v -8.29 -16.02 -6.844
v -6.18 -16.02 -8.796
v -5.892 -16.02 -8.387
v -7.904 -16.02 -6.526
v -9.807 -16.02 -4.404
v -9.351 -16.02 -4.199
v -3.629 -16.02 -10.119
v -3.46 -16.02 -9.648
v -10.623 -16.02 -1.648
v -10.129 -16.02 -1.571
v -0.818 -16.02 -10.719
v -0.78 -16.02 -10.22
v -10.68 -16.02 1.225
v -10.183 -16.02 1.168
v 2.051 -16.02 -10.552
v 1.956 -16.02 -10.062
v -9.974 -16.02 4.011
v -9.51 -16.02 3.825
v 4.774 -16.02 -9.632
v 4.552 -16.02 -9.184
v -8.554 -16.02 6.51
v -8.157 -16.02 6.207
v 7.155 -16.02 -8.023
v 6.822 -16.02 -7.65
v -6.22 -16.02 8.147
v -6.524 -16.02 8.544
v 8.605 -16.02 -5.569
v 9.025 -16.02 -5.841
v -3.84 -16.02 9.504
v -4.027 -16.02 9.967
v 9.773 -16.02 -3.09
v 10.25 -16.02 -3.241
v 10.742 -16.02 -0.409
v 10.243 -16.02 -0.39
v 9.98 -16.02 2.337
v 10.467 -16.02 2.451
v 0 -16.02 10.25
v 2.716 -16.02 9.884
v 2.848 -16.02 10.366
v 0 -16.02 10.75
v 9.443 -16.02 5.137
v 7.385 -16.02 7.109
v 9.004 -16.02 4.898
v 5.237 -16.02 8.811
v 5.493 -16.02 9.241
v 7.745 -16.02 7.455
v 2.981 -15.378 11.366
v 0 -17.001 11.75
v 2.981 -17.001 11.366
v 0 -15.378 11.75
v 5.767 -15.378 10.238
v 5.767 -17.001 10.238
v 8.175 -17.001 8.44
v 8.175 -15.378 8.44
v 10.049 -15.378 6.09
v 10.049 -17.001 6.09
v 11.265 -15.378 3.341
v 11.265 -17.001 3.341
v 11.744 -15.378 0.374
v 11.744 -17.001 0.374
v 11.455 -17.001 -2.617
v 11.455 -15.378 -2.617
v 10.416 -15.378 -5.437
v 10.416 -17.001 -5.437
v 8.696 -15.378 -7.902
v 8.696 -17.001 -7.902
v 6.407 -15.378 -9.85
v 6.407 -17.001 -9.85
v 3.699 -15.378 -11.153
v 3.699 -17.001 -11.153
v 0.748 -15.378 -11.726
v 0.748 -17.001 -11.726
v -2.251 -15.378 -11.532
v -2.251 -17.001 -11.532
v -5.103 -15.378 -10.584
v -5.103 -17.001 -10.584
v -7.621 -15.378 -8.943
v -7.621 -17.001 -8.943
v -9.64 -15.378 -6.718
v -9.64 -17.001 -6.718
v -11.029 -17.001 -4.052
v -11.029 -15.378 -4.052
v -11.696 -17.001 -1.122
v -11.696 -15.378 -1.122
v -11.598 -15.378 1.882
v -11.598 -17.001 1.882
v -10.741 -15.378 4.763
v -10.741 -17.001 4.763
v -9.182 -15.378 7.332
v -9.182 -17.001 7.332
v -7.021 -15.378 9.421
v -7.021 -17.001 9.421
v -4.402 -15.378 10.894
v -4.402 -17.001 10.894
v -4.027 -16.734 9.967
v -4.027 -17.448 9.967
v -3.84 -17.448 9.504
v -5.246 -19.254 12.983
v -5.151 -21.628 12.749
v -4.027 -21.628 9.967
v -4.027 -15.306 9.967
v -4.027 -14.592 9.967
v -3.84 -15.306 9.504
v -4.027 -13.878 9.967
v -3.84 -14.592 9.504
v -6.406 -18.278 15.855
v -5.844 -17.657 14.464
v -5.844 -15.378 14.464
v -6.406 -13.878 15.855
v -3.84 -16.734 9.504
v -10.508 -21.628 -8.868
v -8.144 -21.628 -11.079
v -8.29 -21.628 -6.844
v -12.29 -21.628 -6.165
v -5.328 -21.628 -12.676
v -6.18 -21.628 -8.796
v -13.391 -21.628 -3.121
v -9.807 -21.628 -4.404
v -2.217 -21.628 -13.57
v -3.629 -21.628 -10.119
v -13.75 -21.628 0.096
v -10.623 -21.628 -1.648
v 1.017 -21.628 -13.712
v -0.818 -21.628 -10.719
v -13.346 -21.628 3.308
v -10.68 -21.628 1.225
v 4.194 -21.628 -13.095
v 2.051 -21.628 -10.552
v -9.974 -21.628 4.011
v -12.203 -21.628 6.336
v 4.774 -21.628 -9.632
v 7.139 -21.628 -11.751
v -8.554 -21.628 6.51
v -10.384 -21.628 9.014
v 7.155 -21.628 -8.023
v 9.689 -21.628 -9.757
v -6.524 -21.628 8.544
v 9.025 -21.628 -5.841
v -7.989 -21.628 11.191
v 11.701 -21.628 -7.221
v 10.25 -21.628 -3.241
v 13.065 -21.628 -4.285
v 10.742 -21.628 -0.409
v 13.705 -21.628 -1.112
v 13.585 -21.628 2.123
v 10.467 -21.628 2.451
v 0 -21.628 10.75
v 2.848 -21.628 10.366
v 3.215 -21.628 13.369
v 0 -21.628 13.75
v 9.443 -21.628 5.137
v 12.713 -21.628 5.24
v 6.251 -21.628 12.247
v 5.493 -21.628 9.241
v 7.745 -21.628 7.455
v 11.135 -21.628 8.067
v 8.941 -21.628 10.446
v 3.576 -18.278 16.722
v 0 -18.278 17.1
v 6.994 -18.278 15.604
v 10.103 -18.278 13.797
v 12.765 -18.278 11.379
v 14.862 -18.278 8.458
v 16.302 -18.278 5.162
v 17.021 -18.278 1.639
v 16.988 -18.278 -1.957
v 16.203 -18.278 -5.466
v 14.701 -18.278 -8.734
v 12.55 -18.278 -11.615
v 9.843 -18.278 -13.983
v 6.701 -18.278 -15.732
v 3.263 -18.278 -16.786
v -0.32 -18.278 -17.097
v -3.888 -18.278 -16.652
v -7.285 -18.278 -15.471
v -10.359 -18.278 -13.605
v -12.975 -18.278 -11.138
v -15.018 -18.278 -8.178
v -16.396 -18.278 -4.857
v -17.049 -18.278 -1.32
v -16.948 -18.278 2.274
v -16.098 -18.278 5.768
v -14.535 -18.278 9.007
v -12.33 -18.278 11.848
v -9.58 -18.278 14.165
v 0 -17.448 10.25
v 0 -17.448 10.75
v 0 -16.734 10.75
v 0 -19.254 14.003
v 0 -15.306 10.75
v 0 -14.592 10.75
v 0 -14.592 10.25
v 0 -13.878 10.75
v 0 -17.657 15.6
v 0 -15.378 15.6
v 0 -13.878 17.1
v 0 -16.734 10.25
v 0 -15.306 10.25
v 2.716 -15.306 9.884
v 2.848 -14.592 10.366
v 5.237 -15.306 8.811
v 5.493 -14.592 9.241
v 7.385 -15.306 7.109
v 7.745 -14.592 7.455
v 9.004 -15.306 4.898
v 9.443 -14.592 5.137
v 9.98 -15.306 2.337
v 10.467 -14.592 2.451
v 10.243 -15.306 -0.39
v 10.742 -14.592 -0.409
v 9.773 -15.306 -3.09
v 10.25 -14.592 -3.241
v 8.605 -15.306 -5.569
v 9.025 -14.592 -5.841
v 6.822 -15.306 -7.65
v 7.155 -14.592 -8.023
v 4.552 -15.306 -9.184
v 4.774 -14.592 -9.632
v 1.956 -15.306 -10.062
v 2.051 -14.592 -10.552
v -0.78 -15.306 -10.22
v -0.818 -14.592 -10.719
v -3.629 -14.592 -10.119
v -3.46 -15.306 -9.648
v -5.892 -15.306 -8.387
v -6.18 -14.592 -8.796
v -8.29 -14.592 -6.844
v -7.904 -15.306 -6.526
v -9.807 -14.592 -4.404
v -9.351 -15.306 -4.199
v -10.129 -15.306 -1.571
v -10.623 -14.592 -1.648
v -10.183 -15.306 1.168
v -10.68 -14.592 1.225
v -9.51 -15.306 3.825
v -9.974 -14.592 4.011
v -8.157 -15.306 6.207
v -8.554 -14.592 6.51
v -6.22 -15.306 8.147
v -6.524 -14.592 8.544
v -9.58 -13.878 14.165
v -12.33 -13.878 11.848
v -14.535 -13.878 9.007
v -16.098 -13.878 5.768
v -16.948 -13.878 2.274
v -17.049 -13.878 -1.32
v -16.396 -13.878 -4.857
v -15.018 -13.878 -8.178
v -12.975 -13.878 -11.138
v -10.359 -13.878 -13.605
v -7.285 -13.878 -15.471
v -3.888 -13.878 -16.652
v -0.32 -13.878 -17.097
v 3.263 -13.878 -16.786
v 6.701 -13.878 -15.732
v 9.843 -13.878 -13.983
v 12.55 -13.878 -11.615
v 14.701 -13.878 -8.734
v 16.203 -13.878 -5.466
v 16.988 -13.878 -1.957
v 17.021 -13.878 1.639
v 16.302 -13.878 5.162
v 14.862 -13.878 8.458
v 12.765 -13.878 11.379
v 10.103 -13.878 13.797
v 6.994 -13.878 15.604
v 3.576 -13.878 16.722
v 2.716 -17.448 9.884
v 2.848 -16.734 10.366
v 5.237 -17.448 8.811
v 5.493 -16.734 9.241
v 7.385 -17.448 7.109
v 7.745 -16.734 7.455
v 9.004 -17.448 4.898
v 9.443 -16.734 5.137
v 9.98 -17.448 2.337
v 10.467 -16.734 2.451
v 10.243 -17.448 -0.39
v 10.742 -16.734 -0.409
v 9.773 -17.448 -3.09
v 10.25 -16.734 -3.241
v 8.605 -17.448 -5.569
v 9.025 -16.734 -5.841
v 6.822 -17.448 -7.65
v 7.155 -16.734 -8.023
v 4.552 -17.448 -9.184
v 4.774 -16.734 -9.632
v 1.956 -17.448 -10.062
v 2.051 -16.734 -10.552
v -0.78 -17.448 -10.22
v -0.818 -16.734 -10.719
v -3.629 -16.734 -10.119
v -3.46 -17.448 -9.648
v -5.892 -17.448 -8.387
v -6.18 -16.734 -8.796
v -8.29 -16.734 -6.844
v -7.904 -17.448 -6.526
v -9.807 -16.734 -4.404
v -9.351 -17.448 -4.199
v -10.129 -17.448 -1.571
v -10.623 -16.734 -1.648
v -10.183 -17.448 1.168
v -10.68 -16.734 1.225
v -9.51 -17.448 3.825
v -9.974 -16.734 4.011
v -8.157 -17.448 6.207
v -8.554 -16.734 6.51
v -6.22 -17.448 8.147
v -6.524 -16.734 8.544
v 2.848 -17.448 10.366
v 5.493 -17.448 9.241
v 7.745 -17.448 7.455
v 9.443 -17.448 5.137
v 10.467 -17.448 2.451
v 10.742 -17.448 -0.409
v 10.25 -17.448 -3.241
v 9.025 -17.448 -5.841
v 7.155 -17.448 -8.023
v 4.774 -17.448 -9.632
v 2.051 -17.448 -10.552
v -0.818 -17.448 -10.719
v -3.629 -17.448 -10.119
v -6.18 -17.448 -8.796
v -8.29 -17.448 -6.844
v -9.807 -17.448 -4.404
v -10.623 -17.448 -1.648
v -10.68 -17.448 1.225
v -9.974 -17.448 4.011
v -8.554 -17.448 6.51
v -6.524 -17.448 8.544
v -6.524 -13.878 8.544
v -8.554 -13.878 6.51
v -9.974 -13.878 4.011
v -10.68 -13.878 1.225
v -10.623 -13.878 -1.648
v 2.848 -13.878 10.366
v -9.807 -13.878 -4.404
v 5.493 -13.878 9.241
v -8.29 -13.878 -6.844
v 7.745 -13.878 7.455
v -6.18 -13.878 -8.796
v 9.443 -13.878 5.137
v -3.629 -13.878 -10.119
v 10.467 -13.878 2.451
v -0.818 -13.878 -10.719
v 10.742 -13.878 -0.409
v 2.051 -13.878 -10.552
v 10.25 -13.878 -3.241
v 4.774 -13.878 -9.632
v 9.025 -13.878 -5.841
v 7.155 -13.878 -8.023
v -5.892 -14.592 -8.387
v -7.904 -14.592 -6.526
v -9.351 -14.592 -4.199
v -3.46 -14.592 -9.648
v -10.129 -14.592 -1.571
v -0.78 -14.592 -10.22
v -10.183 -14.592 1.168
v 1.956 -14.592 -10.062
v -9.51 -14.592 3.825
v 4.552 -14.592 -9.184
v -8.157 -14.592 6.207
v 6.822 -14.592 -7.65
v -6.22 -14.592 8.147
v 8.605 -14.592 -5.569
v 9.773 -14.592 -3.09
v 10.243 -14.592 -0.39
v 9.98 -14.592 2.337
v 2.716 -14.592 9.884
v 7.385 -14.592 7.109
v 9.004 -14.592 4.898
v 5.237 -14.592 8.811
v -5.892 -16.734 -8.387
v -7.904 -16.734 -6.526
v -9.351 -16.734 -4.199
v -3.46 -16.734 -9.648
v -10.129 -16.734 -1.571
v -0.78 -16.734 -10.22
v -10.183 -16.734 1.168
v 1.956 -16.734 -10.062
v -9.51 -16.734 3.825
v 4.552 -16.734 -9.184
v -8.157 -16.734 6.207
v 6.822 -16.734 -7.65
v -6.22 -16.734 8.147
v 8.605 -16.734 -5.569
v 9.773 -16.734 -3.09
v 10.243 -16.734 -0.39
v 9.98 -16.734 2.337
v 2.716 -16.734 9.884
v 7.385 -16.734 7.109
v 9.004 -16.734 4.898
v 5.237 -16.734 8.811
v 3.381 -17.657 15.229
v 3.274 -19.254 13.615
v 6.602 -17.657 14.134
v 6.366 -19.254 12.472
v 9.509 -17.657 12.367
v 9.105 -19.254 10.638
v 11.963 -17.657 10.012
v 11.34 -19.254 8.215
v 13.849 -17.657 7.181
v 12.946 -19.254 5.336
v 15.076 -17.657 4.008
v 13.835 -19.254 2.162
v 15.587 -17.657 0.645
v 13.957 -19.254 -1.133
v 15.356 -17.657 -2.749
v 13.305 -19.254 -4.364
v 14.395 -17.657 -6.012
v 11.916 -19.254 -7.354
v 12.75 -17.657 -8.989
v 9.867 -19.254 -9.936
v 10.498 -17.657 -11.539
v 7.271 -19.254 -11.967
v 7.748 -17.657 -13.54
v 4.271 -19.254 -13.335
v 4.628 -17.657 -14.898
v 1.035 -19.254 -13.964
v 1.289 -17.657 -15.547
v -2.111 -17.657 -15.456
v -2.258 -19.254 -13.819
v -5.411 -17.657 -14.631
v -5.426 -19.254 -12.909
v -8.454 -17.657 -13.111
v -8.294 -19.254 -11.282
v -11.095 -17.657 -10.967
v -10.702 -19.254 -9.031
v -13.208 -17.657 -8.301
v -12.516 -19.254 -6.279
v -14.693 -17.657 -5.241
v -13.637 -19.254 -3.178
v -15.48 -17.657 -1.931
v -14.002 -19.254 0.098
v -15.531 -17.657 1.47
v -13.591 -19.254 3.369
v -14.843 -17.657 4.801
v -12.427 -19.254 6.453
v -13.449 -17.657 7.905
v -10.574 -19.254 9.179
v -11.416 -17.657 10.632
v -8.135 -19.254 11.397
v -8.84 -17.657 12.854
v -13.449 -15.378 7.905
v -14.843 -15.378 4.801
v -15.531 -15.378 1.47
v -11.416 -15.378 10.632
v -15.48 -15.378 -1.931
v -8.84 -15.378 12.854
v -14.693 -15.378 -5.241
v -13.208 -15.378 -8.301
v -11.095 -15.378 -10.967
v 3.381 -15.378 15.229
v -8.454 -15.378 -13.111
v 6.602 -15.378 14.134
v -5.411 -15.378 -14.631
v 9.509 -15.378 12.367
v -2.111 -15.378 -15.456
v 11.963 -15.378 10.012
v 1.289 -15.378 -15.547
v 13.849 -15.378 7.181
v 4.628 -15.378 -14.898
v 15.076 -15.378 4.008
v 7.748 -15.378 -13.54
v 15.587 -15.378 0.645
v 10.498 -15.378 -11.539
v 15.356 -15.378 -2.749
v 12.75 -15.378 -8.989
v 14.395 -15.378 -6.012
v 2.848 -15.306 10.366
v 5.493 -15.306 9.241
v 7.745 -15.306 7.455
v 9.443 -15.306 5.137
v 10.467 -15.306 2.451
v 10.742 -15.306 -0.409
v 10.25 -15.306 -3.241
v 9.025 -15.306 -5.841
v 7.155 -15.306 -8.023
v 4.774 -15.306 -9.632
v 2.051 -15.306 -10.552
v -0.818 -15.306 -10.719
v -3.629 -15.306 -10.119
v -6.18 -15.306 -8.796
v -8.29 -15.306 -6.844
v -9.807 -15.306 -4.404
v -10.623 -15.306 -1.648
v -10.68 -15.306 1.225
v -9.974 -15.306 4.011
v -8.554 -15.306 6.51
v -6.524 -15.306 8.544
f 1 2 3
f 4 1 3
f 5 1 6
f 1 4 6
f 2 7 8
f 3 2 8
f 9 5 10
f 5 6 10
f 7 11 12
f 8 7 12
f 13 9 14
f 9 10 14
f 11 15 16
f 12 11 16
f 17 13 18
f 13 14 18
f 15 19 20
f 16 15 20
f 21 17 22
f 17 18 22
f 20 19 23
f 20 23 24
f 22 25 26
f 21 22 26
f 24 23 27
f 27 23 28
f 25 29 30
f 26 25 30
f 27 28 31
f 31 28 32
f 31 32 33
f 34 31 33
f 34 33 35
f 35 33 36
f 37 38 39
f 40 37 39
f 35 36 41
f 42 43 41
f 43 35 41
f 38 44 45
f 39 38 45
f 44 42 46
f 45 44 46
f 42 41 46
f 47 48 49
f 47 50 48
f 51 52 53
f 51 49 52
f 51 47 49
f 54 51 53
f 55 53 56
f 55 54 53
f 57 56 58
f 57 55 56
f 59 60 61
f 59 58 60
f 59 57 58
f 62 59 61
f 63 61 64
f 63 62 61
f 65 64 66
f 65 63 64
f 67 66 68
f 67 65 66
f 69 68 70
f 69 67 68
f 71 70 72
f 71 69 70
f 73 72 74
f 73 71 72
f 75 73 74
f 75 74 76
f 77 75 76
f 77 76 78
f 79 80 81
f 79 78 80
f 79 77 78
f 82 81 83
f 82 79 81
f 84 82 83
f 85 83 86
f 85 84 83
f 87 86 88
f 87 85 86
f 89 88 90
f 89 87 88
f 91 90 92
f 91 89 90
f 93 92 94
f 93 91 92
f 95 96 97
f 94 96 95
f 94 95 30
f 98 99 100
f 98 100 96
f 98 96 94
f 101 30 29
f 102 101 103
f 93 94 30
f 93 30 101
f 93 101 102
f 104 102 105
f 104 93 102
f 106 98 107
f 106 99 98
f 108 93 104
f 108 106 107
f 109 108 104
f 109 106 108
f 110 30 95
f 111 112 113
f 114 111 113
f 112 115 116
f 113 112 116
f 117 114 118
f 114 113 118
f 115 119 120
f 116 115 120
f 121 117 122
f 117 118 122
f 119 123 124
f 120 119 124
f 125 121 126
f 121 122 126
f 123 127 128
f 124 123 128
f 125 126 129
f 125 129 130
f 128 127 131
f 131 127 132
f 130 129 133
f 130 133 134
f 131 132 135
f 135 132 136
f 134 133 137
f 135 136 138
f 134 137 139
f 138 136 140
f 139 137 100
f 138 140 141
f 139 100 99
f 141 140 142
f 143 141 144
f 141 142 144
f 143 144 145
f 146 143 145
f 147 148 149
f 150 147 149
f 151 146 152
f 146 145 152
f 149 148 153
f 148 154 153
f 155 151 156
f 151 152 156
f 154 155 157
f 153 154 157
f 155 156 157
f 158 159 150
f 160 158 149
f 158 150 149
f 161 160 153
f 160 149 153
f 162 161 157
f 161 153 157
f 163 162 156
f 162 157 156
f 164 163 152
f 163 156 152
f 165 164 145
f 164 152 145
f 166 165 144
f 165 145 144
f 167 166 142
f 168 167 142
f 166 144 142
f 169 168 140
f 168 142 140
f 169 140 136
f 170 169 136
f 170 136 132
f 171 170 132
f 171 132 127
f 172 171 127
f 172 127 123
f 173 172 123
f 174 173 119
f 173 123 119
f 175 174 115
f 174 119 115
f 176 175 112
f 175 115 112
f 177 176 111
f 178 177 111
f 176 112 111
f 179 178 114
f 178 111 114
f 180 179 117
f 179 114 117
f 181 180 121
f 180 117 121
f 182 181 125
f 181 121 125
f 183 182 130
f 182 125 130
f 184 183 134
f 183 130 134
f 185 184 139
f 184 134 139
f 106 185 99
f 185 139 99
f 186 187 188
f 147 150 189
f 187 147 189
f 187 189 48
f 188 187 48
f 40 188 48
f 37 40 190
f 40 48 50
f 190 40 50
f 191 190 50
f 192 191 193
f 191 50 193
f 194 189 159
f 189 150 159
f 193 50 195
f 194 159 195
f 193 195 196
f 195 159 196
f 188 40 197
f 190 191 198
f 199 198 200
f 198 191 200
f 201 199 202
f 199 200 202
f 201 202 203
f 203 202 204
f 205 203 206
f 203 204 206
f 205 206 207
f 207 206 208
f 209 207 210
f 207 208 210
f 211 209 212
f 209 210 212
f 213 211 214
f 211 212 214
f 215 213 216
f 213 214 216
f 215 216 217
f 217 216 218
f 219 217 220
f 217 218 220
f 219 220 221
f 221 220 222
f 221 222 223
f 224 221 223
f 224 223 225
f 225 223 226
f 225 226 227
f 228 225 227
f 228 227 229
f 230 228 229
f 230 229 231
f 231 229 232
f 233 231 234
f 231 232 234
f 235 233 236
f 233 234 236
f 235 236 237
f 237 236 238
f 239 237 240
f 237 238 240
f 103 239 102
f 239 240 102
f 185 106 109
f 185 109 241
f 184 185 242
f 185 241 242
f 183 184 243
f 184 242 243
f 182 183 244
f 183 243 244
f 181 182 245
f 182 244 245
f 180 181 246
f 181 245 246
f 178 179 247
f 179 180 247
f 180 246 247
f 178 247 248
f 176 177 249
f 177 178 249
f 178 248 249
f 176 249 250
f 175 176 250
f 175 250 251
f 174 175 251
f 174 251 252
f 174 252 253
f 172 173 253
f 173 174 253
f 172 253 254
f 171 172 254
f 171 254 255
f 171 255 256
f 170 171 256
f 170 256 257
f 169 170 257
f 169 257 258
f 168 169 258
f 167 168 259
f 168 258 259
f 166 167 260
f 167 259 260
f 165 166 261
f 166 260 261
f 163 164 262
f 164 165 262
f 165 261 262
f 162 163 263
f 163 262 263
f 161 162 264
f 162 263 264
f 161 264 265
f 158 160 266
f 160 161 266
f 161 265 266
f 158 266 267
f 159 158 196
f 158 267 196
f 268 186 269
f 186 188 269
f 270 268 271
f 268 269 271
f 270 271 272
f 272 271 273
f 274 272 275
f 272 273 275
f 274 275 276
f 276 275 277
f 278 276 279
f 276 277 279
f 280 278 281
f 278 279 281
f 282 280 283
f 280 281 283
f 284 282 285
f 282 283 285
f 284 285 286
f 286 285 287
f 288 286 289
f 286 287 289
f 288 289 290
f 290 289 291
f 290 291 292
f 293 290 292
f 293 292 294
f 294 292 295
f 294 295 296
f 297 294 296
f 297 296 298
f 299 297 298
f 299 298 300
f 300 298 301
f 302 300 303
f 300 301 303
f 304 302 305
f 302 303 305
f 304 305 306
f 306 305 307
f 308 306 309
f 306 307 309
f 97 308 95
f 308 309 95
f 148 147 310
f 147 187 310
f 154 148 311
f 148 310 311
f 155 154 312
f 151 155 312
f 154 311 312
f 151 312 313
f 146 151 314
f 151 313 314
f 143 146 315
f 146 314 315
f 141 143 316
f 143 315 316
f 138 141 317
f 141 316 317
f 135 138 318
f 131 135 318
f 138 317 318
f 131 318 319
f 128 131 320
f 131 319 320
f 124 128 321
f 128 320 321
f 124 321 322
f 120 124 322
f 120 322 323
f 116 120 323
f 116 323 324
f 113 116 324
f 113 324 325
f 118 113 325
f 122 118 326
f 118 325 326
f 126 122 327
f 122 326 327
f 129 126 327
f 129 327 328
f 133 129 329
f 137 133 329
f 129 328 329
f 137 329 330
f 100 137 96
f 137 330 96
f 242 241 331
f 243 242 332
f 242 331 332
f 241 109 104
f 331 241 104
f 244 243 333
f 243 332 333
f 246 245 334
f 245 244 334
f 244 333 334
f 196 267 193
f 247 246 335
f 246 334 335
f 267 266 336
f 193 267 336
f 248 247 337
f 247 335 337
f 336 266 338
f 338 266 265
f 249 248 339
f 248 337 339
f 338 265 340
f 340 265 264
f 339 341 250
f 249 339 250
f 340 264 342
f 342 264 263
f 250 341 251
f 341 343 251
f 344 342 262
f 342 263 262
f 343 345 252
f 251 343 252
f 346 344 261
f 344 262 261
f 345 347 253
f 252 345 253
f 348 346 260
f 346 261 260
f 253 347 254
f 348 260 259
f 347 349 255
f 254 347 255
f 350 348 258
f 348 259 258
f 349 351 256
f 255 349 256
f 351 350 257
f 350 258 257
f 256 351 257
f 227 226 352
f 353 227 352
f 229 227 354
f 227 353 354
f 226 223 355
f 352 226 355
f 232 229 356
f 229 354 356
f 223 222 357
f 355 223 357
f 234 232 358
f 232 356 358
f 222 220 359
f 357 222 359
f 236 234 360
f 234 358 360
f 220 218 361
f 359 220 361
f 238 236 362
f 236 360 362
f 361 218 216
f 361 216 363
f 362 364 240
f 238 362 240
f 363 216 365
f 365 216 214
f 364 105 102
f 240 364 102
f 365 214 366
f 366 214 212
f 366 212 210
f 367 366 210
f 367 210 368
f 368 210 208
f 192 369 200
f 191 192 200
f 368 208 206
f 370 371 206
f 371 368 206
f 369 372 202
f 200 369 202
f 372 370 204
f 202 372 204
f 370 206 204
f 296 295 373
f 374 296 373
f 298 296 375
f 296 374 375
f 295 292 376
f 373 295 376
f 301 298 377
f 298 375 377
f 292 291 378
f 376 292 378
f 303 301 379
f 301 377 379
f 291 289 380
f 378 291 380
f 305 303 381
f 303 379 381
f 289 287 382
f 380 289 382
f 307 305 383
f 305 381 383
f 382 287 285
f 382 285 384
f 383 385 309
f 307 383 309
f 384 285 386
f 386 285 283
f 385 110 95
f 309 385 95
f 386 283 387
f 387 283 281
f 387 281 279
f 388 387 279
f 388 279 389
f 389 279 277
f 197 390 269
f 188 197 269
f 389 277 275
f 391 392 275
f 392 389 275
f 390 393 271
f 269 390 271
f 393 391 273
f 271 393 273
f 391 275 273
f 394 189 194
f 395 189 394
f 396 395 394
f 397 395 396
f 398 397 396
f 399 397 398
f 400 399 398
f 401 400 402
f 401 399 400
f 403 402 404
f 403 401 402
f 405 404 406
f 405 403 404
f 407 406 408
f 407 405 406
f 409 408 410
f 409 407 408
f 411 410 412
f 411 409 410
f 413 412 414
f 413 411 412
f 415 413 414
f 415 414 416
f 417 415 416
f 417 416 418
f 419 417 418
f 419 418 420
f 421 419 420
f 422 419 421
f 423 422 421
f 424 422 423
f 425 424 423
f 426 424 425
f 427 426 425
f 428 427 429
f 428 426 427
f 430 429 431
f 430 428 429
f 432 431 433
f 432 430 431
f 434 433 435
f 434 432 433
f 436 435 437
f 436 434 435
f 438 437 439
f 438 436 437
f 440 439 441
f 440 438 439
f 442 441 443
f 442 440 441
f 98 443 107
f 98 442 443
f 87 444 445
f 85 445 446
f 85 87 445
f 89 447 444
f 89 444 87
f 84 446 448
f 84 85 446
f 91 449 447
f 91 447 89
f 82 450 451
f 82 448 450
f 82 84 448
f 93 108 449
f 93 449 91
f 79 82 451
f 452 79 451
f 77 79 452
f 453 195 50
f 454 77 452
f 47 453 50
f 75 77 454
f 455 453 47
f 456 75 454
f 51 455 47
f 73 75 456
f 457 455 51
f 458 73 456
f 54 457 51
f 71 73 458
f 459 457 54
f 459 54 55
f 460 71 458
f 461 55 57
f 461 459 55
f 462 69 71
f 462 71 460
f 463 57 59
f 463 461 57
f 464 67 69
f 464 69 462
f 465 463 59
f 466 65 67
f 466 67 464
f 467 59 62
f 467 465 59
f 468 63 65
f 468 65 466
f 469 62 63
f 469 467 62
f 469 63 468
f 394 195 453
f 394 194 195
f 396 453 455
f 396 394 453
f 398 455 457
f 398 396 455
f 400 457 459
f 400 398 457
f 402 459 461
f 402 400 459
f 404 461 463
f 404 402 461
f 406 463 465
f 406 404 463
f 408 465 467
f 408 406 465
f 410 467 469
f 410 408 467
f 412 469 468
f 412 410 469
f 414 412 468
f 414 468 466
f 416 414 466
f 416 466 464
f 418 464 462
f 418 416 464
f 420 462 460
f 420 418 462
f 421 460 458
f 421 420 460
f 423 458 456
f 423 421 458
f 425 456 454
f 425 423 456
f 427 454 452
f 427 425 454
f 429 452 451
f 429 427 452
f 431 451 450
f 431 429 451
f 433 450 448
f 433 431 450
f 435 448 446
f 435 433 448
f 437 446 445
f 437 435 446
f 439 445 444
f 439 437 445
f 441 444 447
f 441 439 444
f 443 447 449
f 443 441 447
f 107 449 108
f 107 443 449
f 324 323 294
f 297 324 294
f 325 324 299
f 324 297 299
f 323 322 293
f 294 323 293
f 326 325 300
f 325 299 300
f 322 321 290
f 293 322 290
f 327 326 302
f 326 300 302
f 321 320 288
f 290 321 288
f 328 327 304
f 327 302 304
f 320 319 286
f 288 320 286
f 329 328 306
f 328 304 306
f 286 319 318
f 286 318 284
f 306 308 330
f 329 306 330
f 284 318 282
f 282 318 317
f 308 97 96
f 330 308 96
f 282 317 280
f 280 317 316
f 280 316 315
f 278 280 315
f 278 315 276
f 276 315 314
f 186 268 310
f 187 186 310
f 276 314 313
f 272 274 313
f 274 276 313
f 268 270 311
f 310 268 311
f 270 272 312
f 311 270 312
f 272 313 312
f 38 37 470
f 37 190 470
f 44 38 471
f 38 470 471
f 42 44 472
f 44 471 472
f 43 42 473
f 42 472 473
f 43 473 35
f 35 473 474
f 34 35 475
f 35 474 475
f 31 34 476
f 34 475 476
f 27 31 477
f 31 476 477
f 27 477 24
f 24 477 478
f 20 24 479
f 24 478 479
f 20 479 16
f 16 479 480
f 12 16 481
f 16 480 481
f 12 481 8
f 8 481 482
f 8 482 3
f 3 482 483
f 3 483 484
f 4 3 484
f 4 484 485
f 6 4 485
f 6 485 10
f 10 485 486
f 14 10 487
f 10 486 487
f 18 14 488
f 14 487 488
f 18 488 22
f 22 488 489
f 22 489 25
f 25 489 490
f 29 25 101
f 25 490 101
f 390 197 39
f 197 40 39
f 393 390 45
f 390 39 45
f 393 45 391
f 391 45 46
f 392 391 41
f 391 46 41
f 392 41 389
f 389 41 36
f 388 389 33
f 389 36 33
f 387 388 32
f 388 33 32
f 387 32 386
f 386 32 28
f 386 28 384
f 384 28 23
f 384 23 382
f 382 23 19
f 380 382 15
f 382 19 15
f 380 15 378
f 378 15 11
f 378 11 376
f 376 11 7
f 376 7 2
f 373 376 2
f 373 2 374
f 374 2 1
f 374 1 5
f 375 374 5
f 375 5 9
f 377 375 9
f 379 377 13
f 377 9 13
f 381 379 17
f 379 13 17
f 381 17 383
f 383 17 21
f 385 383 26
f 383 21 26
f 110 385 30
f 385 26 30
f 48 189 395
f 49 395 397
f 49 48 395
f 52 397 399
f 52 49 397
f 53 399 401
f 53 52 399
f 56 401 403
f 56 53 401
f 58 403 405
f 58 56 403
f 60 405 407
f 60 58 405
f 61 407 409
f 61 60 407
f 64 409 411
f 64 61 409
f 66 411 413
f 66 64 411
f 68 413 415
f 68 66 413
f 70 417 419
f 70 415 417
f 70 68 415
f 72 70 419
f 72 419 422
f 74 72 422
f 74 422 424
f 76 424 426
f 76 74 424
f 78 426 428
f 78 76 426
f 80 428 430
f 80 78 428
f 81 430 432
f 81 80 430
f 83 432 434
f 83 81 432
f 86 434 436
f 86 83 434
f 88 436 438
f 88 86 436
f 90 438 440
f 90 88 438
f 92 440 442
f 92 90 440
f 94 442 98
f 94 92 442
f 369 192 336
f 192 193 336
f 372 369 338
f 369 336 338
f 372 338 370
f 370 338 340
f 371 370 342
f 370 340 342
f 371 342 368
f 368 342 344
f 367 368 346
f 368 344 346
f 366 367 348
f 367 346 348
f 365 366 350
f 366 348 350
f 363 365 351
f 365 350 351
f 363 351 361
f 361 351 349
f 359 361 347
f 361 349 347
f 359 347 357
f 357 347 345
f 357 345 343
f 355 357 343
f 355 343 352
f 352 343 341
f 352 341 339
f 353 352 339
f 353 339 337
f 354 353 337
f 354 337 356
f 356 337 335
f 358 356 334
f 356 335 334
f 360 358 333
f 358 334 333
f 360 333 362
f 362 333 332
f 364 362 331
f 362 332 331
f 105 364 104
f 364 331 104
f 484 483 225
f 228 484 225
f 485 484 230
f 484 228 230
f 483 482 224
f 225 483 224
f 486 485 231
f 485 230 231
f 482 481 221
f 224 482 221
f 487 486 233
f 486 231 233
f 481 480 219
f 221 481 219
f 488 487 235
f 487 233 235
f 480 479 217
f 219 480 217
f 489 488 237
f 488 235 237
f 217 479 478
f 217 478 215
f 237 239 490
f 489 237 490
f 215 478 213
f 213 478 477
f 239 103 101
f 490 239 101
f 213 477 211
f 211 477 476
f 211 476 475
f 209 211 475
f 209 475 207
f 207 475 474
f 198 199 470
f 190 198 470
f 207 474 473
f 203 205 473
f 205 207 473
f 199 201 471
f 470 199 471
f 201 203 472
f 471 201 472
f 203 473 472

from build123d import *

# Parameters (mm, degrees)
F2_ANGLE = 338
F3_R     = 29.1
F3_R_2   = 17.1
F4_DEPTH = 25


with BuildPart() as f2:
    # F1 (on Right) → F2 (revolve)
    with BuildSketch(Plane.YZ):
        Polygon((-14.592193, 10.25), (-13.878119, 10.75), (-13.878119, 20.5), (-14.878119, 20.5), (-21.628119, 13.75), (-21.628119, 10.75), (-17.448489, 10.75), (-17.448489, 10.25), (-16.734415, 10.75), (-16.734415, 10.25), (-16.020341, 10.75), (-16.020341, 10.25), (-15.306267, 10.75), (-15.306267, 10.25), (-14.592193, 10.75), align=None)
    revolve(axis=Axis((0, -8.217514, 0), (0, 1, 0)), revolution_arc=F2_ANGLE)

    # F3 (on Front) → F4 (cut)
    with BuildSketch(Plane.XZ):
        Circle(F3_R)
        Circle(F3_R_2, mode=Mode.SUBTRACT)
    extrude(amount=F4_DEPTH, mode=Mode.SUBTRACT)

    # F5 (on face) → F6 (revolve, cut)
    with BuildSketch(Plane(origin=(0, 0, 0), x_dir=(0, 1, 0), z_dir=(0.927184, 0, 0.374607))):
        Polygon((-15.378119, 11.75), (-15.378119, 15.6), (-17.656798, 15.6), (-19.254081, 14.002717), (-17.001364, 11.75), align=None)
    revolve(axis=Axis((0, -8.217514, 0), (0, 1, 0)), mode=Mode.SUBTRACT)


solid = f2.part
